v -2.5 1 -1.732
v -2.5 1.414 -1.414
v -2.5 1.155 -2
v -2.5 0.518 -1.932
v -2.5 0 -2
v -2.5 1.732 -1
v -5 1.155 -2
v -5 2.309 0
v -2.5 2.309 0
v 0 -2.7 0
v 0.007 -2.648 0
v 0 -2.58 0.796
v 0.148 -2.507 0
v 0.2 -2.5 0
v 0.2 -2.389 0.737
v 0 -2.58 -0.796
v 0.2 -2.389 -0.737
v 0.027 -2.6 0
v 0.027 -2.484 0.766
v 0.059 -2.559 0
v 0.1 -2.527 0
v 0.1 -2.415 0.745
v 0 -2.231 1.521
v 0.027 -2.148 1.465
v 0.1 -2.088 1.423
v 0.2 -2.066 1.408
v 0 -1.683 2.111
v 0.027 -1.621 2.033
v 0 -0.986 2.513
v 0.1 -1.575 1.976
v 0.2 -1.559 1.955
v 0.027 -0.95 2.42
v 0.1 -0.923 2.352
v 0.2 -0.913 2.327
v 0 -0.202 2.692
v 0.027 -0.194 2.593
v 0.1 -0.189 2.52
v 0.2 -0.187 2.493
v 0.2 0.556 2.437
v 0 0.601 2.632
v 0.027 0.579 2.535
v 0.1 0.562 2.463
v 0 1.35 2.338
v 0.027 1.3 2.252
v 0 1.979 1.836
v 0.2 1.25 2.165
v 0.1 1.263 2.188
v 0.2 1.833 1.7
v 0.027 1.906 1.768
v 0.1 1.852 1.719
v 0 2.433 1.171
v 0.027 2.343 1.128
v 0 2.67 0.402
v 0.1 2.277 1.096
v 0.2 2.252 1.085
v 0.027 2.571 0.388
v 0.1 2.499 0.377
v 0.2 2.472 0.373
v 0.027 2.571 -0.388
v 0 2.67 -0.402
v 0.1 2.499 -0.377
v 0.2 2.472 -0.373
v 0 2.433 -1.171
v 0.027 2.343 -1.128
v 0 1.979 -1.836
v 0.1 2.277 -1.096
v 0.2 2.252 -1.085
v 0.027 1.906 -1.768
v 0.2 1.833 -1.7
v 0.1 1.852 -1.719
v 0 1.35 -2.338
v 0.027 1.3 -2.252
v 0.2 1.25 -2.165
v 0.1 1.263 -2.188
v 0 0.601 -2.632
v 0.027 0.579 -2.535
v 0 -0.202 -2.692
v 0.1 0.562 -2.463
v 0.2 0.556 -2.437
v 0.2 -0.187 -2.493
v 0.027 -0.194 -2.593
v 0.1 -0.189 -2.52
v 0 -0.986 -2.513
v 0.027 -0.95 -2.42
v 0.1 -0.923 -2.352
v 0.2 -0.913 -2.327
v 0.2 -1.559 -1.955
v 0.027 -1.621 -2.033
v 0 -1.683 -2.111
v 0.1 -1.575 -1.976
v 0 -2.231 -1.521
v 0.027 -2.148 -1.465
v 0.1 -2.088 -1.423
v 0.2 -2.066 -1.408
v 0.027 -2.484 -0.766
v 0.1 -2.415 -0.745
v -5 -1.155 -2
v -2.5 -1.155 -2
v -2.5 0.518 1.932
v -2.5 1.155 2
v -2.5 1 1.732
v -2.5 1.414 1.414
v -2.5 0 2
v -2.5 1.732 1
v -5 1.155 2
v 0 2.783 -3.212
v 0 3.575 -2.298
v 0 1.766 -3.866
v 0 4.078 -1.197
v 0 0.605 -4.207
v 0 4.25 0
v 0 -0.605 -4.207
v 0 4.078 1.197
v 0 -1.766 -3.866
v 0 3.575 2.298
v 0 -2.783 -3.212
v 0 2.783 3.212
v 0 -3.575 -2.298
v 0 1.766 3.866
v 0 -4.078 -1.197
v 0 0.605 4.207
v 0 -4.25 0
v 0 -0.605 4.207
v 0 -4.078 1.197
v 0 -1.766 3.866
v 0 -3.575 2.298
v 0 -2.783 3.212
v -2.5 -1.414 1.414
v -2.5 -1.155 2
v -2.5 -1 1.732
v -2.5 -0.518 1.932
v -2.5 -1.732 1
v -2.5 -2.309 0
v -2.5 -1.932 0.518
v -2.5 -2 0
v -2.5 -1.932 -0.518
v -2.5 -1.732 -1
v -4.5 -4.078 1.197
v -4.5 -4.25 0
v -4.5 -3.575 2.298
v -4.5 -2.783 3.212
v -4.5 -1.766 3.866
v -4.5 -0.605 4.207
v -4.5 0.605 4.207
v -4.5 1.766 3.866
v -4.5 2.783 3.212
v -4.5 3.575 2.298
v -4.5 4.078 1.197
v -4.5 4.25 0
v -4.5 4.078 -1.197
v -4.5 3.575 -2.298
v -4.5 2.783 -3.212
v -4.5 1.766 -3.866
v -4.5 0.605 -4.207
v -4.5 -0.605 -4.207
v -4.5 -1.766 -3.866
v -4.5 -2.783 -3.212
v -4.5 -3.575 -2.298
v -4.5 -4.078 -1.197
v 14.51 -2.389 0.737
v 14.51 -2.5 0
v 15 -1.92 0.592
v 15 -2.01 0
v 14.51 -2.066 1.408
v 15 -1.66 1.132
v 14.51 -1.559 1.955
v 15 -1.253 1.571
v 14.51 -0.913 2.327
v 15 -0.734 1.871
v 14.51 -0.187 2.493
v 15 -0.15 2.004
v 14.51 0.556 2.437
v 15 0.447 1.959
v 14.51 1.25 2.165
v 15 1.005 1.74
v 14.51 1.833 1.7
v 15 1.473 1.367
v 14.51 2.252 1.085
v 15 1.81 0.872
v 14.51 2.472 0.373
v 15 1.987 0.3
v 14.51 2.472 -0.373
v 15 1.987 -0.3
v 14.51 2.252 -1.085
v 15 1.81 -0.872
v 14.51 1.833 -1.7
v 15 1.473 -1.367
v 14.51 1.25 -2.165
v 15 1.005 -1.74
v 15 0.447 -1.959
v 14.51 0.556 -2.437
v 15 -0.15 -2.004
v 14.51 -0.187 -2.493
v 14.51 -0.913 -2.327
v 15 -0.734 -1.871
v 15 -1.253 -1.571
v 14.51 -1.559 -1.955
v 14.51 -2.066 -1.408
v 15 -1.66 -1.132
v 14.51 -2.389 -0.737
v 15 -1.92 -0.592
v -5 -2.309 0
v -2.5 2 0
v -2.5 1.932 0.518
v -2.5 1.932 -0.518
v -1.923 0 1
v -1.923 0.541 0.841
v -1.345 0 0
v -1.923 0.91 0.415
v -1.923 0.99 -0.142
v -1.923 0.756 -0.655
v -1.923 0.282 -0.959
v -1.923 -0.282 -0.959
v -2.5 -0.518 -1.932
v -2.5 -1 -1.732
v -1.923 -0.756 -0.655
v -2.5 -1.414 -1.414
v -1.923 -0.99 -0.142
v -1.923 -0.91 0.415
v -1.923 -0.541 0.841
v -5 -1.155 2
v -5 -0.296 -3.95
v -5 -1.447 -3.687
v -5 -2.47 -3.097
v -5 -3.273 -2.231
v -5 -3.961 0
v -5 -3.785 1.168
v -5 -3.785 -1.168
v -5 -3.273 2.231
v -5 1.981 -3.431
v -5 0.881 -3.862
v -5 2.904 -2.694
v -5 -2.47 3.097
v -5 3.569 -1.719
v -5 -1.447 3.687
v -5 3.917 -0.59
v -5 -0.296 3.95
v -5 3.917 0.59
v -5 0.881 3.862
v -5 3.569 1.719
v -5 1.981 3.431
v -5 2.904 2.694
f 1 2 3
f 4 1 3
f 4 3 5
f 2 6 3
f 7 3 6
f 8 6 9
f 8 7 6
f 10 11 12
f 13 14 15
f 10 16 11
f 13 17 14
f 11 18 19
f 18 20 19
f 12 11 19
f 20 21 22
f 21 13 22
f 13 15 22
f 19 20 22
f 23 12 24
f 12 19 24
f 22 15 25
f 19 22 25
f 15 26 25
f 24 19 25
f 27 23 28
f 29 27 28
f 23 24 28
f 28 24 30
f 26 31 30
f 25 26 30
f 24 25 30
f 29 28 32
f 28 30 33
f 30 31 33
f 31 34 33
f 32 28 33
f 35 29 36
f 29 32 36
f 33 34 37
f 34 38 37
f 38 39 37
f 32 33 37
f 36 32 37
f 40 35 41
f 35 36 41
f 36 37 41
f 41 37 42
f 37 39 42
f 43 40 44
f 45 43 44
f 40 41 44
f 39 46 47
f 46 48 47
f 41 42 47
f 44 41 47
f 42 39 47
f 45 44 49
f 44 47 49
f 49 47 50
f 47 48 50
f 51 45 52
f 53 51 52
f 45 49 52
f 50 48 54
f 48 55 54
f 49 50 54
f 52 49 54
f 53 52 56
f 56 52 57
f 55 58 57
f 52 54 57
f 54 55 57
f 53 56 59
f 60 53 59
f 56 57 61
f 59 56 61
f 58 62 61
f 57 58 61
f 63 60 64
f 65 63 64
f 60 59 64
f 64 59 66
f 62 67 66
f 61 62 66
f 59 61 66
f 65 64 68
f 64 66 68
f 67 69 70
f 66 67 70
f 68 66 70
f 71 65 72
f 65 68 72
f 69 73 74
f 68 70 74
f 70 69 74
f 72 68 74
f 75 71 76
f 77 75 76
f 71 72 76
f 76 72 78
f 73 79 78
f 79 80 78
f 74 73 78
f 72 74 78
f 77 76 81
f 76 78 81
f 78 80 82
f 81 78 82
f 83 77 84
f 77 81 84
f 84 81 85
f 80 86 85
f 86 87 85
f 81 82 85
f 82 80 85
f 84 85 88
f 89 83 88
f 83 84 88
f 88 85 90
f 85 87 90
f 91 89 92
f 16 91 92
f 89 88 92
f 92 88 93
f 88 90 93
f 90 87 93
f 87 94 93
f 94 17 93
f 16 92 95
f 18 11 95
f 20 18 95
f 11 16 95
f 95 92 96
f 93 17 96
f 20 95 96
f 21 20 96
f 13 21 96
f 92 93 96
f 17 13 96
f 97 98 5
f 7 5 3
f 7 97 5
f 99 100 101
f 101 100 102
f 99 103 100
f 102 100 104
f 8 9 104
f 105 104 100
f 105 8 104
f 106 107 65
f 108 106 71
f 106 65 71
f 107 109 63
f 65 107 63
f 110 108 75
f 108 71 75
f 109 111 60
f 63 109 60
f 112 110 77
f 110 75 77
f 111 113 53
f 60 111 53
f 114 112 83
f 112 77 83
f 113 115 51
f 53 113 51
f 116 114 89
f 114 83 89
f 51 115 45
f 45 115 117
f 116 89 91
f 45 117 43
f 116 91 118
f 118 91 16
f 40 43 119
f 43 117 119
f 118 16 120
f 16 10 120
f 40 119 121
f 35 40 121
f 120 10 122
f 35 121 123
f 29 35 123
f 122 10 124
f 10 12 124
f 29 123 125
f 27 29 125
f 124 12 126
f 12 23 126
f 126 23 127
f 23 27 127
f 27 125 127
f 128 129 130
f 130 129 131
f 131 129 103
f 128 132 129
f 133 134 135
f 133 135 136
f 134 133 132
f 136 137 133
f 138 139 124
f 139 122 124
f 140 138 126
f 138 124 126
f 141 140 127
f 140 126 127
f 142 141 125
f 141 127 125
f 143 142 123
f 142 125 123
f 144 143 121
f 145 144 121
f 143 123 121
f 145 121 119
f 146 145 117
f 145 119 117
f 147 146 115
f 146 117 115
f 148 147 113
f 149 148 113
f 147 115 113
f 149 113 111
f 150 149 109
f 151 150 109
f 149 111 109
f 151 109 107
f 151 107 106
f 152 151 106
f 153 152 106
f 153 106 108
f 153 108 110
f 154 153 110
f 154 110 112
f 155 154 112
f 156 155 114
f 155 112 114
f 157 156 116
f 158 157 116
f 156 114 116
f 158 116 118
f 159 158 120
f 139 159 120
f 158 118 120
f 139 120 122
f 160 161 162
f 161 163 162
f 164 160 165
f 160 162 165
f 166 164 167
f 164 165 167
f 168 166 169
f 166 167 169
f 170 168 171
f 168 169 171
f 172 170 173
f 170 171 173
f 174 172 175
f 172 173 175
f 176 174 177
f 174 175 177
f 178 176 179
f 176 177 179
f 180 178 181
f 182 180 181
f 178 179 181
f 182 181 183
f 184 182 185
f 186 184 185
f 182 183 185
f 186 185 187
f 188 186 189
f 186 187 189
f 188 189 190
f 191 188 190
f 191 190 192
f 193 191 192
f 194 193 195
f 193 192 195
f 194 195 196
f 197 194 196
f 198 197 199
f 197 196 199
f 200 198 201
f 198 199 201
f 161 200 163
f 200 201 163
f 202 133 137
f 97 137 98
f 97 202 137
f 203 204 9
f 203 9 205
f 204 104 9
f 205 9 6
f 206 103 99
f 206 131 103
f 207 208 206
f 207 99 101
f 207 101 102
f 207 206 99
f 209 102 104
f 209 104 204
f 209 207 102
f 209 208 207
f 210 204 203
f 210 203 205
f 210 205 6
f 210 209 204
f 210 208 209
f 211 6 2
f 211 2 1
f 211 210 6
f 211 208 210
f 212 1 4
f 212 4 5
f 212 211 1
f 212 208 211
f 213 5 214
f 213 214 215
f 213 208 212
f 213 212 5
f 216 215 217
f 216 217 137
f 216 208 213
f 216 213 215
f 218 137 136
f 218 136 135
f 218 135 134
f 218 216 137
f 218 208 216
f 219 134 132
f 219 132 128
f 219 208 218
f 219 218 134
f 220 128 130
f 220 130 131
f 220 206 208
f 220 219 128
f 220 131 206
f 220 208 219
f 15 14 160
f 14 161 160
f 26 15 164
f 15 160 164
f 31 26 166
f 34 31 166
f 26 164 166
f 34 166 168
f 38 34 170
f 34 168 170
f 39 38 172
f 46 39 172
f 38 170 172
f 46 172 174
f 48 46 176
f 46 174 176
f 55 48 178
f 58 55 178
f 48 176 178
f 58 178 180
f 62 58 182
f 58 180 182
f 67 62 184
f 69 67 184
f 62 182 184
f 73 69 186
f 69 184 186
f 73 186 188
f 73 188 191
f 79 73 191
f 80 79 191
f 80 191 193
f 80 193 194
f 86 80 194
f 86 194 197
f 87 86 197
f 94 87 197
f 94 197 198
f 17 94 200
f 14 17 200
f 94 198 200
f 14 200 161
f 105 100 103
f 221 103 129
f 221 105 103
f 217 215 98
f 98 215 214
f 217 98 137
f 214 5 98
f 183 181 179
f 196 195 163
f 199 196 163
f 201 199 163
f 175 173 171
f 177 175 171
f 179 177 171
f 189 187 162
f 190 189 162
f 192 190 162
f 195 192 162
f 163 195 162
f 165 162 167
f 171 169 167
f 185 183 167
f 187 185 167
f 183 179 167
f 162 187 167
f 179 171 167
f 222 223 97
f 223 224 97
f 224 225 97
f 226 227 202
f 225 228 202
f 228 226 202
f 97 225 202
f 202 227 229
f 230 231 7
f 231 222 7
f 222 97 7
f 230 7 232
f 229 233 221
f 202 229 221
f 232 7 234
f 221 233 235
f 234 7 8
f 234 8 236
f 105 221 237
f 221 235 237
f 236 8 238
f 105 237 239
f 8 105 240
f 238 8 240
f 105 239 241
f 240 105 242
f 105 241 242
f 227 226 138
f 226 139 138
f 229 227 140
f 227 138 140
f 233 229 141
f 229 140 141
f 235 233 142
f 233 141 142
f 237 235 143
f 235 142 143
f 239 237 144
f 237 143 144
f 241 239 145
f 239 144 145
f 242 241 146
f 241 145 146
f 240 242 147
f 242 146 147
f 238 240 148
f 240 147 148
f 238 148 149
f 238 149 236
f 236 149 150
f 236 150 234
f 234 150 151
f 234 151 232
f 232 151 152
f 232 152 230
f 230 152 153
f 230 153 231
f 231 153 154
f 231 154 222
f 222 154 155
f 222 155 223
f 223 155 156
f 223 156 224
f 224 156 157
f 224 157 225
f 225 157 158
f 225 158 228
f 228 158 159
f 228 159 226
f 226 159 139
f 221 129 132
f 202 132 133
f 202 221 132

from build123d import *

# Parameters (mm, degrees)
CUT_EXTRUDE_1_DEPTH = 2.5


with BuildPart() as part:
    # 草图1 → 旋转1 (revolve)
    with BuildSketch(Plane.XY):
        with BuildLine():
            Line((-5, 0), (-5, 3.961324865))
            Line((-5, 3.961324865), (-4.5, 4.25))
            Line((-4.5, 4.25), (0, 4.25))
            Line((0, 4.25), (0, 2.7))
            ThreePointArc((0, 2.7), (0.058578644, 2.558578644), (0.2, 2.5))
            Line((0.2, 2.5), (14.5095, 2.5))
            Line((14.5095, 2.5), (15, 2.0095))
            Line((15, 2.0095), (15, 0))
            Line((15, 0), (-5, 0))
        make_face()
    revolve(axis=Axis((15, 0, 0), (-1, 0, 0)))

    # 草图2 → 切除-旋转1 (revolve, cut)
    with BuildSketch(Plane.XY):
        Polygon((-5, 0), (-5, 2), (-2.5, 2), (-1.345299462, 0), align=None)
    revolve(axis=Axis((-1.345299462, 0, 0), (-1, 0, 0)), mode=Mode.SUBTRACT)

    # 草图3 → 切除-拉伸1 (cut)
    with BuildSketch(Plane(origin=(-5, 0, 0), x_dir=(0, 0, -1), z_dir=(1, 0, 0))):
        Polygon((-2, -1.154700538), (0, -2.309401077), (2, -1.154700538), (2, 1.154700538), (0, 2.309401077), (-2, 1.154700538), align=None)
    extrude(amount=CUT_EXTRUDE_1_DEPTH, mode=Mode.SUBTRACT)


solid = part.part
